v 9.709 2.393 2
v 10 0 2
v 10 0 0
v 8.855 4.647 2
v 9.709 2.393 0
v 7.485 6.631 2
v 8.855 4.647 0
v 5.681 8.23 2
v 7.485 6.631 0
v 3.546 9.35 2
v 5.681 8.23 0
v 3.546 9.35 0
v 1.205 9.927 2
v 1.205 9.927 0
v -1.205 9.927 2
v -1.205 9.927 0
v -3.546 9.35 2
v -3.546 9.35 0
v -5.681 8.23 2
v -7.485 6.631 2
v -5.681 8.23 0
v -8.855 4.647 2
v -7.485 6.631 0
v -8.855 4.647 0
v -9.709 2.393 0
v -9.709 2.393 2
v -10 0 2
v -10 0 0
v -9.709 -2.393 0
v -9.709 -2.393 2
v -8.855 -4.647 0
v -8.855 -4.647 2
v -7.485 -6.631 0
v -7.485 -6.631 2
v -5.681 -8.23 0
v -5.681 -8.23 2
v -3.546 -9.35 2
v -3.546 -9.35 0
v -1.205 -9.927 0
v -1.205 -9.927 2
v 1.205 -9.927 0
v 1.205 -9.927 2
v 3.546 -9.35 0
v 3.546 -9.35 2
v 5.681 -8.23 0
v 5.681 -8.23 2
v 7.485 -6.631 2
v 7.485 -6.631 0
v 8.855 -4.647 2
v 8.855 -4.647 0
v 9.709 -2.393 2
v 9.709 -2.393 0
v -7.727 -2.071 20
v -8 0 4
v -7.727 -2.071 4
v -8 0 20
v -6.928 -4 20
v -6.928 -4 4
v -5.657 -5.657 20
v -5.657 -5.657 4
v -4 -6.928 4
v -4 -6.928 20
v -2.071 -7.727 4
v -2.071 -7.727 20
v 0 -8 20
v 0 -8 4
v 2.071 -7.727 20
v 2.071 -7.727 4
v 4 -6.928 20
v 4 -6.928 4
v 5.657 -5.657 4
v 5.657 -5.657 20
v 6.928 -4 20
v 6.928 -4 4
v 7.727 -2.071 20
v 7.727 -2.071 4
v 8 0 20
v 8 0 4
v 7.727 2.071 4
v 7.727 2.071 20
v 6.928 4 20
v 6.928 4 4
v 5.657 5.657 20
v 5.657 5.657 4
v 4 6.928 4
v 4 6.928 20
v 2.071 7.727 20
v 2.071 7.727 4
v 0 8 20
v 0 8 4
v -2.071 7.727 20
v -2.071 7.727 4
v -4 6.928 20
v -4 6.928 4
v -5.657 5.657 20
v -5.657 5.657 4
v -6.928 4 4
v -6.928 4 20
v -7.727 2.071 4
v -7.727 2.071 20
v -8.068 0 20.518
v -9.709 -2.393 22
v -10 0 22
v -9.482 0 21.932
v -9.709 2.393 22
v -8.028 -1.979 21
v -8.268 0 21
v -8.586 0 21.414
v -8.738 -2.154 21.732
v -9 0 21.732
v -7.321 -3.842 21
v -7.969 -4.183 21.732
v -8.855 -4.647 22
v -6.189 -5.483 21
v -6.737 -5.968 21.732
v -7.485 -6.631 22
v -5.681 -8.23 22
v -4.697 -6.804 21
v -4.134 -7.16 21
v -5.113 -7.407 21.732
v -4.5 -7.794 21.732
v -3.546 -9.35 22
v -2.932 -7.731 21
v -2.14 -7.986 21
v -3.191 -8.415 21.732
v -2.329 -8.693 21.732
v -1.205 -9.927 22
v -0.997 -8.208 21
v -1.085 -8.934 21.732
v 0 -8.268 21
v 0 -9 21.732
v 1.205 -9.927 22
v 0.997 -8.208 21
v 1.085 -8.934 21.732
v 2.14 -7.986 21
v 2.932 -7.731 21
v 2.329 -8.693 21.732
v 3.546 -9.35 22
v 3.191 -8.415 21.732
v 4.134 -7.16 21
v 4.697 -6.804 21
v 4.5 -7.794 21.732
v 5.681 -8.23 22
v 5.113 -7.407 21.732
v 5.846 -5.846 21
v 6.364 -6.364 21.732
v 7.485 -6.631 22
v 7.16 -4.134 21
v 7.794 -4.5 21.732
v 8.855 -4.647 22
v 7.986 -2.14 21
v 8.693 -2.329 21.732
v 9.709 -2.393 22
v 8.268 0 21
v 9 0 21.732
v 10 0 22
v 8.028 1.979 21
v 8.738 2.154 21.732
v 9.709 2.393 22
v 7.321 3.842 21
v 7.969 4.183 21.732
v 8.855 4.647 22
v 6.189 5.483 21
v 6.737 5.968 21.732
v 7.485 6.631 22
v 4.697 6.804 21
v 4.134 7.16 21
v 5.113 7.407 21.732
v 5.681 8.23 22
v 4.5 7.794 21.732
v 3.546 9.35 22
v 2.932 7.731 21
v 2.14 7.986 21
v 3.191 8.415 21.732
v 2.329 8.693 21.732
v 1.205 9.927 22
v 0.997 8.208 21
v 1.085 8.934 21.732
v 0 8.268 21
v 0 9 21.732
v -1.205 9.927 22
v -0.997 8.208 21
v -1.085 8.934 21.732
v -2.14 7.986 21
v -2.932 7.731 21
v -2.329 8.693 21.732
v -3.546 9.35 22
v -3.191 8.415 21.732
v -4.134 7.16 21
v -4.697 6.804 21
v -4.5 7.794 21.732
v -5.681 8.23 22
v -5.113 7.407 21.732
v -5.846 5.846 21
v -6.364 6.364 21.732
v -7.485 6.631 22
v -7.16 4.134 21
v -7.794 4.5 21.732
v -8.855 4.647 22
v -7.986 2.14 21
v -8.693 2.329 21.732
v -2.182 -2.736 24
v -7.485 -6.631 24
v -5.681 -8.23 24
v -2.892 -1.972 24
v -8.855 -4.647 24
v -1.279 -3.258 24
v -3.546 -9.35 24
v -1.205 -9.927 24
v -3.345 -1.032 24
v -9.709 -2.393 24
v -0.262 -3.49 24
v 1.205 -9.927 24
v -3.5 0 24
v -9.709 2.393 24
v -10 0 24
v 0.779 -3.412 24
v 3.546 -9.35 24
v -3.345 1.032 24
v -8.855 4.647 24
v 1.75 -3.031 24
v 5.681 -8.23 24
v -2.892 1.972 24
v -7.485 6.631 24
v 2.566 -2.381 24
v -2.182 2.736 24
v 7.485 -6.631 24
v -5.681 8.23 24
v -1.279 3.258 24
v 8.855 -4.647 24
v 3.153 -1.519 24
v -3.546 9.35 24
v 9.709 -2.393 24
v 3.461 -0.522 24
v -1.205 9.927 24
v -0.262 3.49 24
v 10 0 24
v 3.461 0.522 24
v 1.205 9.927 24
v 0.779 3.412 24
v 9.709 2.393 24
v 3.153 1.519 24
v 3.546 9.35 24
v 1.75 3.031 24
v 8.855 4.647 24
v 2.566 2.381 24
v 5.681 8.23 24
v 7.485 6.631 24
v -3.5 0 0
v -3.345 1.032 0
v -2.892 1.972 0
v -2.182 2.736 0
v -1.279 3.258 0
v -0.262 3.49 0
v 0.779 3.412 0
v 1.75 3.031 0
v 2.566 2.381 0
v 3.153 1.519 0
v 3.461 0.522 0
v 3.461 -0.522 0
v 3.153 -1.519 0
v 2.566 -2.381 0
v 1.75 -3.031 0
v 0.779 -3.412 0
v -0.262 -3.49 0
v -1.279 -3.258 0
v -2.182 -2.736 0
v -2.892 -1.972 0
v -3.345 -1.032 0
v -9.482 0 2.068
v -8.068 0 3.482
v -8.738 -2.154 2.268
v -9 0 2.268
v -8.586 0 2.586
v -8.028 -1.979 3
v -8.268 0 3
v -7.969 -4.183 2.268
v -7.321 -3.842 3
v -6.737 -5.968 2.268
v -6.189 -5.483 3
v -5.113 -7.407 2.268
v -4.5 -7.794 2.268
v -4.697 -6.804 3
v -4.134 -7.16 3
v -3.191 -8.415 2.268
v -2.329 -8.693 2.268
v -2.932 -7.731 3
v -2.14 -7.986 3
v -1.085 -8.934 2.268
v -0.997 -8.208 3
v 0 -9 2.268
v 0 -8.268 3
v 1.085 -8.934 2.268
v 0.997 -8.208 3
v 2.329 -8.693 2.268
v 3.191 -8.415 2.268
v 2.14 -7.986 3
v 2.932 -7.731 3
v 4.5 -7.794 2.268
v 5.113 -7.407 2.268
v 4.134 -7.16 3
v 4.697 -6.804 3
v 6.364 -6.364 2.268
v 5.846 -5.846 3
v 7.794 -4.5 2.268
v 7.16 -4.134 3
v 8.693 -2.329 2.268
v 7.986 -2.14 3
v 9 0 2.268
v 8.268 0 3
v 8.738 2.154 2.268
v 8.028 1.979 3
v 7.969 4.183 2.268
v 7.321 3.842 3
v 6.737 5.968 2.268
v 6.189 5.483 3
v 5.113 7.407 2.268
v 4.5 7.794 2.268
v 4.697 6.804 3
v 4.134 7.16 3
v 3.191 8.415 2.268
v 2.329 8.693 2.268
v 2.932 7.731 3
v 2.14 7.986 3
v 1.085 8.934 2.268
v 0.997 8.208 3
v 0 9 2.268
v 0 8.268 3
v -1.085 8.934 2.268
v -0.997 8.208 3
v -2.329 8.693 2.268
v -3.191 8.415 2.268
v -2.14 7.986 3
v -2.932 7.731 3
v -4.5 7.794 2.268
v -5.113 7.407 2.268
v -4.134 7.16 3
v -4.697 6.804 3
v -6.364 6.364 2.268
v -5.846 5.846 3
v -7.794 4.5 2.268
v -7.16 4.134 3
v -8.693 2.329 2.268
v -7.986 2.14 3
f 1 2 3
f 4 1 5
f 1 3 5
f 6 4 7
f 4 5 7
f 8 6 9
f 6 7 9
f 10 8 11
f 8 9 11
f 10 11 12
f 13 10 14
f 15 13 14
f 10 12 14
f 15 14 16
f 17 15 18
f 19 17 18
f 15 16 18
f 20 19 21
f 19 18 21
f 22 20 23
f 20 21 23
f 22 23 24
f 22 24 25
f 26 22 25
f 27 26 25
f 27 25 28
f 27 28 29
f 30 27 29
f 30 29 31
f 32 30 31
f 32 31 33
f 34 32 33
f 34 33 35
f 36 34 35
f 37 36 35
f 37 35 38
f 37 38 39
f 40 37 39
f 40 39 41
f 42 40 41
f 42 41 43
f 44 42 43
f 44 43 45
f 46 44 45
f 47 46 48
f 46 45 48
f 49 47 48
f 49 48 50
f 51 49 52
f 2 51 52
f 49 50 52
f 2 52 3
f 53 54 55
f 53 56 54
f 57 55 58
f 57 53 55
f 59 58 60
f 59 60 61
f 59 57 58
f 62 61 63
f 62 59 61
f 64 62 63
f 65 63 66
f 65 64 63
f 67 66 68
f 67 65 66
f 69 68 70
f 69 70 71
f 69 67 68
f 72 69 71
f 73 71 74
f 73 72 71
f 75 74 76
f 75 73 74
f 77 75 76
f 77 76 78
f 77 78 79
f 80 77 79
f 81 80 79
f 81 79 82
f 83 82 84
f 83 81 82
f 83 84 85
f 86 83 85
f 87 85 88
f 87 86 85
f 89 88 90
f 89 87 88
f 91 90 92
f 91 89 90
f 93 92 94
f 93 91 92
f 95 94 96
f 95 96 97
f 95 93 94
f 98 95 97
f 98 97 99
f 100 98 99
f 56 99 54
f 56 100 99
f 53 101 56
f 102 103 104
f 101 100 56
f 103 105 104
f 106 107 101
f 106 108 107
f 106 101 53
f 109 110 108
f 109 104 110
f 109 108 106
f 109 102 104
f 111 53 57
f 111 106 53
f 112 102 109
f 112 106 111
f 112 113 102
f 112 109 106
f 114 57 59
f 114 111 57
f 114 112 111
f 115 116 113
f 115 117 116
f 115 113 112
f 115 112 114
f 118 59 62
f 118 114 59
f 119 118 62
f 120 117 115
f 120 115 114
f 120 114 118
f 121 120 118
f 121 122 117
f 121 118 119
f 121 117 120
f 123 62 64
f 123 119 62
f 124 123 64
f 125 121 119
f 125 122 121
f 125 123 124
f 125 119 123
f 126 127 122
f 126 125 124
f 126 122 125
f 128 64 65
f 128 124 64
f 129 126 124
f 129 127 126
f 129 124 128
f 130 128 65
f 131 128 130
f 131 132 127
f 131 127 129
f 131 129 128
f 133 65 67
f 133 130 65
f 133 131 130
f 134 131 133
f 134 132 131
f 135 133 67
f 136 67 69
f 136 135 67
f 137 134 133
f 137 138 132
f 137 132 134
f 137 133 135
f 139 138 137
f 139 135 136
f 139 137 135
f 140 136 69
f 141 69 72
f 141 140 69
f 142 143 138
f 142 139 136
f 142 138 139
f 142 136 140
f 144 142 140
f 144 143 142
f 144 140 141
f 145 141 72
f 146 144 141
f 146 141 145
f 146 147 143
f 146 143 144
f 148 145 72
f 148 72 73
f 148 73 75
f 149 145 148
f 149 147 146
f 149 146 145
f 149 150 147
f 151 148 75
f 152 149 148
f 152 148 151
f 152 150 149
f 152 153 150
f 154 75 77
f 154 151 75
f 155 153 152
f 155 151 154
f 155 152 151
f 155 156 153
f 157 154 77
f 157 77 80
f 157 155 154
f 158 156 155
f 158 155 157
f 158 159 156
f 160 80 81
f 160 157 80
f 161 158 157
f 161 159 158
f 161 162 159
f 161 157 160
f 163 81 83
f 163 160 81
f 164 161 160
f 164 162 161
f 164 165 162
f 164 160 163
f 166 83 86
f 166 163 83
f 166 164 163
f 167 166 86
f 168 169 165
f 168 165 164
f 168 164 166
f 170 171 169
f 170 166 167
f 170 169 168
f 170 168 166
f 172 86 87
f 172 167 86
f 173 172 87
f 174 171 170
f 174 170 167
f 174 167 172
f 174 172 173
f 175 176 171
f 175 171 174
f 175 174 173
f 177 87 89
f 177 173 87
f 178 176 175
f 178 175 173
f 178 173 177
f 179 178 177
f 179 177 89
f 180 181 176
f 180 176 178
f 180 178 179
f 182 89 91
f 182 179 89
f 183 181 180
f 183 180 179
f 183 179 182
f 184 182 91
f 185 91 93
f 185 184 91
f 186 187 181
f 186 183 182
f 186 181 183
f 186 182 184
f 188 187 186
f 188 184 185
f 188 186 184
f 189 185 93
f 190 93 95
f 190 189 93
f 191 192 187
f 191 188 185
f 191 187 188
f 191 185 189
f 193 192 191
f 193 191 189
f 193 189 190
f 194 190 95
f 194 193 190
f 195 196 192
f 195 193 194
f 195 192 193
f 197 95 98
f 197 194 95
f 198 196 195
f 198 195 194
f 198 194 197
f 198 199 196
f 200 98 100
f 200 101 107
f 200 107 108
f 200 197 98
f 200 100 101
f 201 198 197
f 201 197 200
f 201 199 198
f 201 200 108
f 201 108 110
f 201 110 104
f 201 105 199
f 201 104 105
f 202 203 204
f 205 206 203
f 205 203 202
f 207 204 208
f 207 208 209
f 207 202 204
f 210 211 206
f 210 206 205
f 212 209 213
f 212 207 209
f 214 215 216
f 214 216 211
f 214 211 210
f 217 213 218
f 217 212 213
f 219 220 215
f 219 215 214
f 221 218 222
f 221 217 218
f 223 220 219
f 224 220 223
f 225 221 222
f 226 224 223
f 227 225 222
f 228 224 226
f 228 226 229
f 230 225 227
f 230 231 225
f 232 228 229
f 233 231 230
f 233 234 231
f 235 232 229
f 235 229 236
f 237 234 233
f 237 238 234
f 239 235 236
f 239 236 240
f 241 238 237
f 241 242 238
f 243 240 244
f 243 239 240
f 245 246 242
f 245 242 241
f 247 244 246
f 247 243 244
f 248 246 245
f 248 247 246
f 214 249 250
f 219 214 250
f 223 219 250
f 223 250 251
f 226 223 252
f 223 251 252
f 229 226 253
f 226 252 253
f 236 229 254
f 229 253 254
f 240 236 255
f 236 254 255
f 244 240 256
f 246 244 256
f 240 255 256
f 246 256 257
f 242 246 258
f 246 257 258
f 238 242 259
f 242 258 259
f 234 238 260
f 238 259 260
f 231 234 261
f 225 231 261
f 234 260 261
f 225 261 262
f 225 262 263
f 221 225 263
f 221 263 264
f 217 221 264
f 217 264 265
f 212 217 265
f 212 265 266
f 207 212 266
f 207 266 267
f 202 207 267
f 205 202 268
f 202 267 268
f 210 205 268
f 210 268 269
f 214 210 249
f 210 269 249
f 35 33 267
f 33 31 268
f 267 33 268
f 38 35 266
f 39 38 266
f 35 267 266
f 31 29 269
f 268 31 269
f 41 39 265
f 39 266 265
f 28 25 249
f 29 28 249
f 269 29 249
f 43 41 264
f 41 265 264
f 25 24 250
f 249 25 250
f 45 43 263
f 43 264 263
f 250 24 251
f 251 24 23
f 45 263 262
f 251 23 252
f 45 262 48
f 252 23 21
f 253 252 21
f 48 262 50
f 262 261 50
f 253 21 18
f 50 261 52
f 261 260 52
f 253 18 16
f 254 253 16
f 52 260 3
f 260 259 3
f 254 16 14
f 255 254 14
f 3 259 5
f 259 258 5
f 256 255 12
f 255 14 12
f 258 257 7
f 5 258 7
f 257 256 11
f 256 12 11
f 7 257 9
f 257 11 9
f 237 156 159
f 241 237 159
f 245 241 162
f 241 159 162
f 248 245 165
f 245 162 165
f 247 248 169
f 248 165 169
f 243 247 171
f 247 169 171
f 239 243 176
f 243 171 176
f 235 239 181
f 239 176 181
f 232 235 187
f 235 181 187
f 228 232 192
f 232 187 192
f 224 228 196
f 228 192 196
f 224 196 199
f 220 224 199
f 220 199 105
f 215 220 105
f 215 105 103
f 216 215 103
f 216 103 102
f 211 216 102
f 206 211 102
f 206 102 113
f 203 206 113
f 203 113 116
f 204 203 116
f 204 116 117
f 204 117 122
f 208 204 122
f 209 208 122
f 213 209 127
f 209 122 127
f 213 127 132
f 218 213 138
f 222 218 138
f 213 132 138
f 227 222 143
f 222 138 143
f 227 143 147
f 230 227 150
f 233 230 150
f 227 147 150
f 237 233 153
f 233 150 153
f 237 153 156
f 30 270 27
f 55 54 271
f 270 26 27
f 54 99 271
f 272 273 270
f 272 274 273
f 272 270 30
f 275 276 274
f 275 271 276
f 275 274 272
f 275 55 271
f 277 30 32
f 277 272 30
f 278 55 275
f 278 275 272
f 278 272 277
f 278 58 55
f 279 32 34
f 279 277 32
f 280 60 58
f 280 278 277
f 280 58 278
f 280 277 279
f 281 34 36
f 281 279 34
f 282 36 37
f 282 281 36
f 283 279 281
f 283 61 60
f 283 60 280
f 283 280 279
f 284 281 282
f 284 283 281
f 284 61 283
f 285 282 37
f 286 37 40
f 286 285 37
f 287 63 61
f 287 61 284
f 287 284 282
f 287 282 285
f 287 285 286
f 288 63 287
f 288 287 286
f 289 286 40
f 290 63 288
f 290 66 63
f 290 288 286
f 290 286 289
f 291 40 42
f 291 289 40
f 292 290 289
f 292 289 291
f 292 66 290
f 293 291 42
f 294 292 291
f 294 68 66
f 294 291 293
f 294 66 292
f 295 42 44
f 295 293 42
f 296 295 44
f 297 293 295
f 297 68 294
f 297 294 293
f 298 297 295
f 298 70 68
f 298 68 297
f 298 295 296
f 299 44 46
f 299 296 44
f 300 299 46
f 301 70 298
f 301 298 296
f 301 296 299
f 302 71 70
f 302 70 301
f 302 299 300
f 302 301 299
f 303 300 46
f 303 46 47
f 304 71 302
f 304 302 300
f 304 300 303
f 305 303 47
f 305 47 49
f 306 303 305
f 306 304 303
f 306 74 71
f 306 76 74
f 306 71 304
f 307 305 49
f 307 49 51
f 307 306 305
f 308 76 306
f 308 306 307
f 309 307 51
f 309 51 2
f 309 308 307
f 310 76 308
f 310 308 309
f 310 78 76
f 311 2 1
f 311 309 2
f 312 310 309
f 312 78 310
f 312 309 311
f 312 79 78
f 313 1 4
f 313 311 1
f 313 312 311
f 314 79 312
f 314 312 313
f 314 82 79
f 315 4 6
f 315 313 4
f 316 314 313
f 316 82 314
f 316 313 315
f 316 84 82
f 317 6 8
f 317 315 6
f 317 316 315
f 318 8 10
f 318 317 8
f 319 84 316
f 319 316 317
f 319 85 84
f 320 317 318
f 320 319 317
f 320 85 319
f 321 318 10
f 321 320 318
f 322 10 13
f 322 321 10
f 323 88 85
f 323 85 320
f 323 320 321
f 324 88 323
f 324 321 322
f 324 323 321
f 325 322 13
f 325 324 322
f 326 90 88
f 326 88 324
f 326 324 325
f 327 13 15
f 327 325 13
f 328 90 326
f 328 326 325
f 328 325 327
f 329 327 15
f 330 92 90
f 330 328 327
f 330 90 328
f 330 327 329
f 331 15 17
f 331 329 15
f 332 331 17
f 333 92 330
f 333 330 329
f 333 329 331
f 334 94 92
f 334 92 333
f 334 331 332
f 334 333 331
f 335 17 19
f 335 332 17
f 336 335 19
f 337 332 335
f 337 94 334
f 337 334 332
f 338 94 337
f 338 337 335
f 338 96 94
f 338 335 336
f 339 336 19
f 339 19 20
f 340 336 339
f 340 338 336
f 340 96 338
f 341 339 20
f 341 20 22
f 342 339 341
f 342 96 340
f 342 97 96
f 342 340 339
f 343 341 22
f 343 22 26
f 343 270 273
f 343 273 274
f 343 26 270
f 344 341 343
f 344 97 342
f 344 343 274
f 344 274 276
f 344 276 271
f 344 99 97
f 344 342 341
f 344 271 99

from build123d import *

# Parameters (mm, degrees)
SKETCH1_R           = 10
BOSS_EXTRUDE1_DEPTH = 24
SKETCH3_R           = 3.5
CUT_EXTRUDE1_DEPTH  = 24


with BuildPart() as part:
    # Sketch1 → Boss-Extrude1 (new body)
    with BuildSketch(Plane.XY):
        Circle(SKETCH1_R)
    extrude(amount=BOSS_EXTRUDE1_DEPTH)

    # Sketch2 → Cut-Revolve1 (revolve, cut)
    with BuildSketch(Plane(origin=(0, 0, 0), x_dir=(0, 0, -1), z_dir=(1, 0, 0)), mode=Mode.PRIVATE) as cut_revolve1_sk:
        with BuildLine():
            Line((-22, 10), (-2, 10))
            ThreePointArc((-2, 10), (-2.585786438, 8.585786438), (-4, 8))
            Line((-4, 8), (-20, 8))
            ThreePointArc((-20, 8), (-21.414213562, 8.585786438), (-22, 10))
        make_face()
    revolve(cut_revolve1_sk.sketch.rotate(Axis((0, 0, -0.3), (0, 0, 1)), 90), axis=Axis((0, 0, -0.3), (0, 0, 1)), mode=Mode.SUBTRACT)

    # Sketch3 → Cut-Extrude1 (cut)
    with BuildSketch(Plane(origin=(0, 0, 0), x_dir=(-1, 0, 0), z_dir=(0, 0, -1))):
        Circle(SKETCH3_R)
    extrude(amount=-CUT_EXTRUDE1_DEPTH, mode=Mode.SUBTRACT)


solid = part.part
